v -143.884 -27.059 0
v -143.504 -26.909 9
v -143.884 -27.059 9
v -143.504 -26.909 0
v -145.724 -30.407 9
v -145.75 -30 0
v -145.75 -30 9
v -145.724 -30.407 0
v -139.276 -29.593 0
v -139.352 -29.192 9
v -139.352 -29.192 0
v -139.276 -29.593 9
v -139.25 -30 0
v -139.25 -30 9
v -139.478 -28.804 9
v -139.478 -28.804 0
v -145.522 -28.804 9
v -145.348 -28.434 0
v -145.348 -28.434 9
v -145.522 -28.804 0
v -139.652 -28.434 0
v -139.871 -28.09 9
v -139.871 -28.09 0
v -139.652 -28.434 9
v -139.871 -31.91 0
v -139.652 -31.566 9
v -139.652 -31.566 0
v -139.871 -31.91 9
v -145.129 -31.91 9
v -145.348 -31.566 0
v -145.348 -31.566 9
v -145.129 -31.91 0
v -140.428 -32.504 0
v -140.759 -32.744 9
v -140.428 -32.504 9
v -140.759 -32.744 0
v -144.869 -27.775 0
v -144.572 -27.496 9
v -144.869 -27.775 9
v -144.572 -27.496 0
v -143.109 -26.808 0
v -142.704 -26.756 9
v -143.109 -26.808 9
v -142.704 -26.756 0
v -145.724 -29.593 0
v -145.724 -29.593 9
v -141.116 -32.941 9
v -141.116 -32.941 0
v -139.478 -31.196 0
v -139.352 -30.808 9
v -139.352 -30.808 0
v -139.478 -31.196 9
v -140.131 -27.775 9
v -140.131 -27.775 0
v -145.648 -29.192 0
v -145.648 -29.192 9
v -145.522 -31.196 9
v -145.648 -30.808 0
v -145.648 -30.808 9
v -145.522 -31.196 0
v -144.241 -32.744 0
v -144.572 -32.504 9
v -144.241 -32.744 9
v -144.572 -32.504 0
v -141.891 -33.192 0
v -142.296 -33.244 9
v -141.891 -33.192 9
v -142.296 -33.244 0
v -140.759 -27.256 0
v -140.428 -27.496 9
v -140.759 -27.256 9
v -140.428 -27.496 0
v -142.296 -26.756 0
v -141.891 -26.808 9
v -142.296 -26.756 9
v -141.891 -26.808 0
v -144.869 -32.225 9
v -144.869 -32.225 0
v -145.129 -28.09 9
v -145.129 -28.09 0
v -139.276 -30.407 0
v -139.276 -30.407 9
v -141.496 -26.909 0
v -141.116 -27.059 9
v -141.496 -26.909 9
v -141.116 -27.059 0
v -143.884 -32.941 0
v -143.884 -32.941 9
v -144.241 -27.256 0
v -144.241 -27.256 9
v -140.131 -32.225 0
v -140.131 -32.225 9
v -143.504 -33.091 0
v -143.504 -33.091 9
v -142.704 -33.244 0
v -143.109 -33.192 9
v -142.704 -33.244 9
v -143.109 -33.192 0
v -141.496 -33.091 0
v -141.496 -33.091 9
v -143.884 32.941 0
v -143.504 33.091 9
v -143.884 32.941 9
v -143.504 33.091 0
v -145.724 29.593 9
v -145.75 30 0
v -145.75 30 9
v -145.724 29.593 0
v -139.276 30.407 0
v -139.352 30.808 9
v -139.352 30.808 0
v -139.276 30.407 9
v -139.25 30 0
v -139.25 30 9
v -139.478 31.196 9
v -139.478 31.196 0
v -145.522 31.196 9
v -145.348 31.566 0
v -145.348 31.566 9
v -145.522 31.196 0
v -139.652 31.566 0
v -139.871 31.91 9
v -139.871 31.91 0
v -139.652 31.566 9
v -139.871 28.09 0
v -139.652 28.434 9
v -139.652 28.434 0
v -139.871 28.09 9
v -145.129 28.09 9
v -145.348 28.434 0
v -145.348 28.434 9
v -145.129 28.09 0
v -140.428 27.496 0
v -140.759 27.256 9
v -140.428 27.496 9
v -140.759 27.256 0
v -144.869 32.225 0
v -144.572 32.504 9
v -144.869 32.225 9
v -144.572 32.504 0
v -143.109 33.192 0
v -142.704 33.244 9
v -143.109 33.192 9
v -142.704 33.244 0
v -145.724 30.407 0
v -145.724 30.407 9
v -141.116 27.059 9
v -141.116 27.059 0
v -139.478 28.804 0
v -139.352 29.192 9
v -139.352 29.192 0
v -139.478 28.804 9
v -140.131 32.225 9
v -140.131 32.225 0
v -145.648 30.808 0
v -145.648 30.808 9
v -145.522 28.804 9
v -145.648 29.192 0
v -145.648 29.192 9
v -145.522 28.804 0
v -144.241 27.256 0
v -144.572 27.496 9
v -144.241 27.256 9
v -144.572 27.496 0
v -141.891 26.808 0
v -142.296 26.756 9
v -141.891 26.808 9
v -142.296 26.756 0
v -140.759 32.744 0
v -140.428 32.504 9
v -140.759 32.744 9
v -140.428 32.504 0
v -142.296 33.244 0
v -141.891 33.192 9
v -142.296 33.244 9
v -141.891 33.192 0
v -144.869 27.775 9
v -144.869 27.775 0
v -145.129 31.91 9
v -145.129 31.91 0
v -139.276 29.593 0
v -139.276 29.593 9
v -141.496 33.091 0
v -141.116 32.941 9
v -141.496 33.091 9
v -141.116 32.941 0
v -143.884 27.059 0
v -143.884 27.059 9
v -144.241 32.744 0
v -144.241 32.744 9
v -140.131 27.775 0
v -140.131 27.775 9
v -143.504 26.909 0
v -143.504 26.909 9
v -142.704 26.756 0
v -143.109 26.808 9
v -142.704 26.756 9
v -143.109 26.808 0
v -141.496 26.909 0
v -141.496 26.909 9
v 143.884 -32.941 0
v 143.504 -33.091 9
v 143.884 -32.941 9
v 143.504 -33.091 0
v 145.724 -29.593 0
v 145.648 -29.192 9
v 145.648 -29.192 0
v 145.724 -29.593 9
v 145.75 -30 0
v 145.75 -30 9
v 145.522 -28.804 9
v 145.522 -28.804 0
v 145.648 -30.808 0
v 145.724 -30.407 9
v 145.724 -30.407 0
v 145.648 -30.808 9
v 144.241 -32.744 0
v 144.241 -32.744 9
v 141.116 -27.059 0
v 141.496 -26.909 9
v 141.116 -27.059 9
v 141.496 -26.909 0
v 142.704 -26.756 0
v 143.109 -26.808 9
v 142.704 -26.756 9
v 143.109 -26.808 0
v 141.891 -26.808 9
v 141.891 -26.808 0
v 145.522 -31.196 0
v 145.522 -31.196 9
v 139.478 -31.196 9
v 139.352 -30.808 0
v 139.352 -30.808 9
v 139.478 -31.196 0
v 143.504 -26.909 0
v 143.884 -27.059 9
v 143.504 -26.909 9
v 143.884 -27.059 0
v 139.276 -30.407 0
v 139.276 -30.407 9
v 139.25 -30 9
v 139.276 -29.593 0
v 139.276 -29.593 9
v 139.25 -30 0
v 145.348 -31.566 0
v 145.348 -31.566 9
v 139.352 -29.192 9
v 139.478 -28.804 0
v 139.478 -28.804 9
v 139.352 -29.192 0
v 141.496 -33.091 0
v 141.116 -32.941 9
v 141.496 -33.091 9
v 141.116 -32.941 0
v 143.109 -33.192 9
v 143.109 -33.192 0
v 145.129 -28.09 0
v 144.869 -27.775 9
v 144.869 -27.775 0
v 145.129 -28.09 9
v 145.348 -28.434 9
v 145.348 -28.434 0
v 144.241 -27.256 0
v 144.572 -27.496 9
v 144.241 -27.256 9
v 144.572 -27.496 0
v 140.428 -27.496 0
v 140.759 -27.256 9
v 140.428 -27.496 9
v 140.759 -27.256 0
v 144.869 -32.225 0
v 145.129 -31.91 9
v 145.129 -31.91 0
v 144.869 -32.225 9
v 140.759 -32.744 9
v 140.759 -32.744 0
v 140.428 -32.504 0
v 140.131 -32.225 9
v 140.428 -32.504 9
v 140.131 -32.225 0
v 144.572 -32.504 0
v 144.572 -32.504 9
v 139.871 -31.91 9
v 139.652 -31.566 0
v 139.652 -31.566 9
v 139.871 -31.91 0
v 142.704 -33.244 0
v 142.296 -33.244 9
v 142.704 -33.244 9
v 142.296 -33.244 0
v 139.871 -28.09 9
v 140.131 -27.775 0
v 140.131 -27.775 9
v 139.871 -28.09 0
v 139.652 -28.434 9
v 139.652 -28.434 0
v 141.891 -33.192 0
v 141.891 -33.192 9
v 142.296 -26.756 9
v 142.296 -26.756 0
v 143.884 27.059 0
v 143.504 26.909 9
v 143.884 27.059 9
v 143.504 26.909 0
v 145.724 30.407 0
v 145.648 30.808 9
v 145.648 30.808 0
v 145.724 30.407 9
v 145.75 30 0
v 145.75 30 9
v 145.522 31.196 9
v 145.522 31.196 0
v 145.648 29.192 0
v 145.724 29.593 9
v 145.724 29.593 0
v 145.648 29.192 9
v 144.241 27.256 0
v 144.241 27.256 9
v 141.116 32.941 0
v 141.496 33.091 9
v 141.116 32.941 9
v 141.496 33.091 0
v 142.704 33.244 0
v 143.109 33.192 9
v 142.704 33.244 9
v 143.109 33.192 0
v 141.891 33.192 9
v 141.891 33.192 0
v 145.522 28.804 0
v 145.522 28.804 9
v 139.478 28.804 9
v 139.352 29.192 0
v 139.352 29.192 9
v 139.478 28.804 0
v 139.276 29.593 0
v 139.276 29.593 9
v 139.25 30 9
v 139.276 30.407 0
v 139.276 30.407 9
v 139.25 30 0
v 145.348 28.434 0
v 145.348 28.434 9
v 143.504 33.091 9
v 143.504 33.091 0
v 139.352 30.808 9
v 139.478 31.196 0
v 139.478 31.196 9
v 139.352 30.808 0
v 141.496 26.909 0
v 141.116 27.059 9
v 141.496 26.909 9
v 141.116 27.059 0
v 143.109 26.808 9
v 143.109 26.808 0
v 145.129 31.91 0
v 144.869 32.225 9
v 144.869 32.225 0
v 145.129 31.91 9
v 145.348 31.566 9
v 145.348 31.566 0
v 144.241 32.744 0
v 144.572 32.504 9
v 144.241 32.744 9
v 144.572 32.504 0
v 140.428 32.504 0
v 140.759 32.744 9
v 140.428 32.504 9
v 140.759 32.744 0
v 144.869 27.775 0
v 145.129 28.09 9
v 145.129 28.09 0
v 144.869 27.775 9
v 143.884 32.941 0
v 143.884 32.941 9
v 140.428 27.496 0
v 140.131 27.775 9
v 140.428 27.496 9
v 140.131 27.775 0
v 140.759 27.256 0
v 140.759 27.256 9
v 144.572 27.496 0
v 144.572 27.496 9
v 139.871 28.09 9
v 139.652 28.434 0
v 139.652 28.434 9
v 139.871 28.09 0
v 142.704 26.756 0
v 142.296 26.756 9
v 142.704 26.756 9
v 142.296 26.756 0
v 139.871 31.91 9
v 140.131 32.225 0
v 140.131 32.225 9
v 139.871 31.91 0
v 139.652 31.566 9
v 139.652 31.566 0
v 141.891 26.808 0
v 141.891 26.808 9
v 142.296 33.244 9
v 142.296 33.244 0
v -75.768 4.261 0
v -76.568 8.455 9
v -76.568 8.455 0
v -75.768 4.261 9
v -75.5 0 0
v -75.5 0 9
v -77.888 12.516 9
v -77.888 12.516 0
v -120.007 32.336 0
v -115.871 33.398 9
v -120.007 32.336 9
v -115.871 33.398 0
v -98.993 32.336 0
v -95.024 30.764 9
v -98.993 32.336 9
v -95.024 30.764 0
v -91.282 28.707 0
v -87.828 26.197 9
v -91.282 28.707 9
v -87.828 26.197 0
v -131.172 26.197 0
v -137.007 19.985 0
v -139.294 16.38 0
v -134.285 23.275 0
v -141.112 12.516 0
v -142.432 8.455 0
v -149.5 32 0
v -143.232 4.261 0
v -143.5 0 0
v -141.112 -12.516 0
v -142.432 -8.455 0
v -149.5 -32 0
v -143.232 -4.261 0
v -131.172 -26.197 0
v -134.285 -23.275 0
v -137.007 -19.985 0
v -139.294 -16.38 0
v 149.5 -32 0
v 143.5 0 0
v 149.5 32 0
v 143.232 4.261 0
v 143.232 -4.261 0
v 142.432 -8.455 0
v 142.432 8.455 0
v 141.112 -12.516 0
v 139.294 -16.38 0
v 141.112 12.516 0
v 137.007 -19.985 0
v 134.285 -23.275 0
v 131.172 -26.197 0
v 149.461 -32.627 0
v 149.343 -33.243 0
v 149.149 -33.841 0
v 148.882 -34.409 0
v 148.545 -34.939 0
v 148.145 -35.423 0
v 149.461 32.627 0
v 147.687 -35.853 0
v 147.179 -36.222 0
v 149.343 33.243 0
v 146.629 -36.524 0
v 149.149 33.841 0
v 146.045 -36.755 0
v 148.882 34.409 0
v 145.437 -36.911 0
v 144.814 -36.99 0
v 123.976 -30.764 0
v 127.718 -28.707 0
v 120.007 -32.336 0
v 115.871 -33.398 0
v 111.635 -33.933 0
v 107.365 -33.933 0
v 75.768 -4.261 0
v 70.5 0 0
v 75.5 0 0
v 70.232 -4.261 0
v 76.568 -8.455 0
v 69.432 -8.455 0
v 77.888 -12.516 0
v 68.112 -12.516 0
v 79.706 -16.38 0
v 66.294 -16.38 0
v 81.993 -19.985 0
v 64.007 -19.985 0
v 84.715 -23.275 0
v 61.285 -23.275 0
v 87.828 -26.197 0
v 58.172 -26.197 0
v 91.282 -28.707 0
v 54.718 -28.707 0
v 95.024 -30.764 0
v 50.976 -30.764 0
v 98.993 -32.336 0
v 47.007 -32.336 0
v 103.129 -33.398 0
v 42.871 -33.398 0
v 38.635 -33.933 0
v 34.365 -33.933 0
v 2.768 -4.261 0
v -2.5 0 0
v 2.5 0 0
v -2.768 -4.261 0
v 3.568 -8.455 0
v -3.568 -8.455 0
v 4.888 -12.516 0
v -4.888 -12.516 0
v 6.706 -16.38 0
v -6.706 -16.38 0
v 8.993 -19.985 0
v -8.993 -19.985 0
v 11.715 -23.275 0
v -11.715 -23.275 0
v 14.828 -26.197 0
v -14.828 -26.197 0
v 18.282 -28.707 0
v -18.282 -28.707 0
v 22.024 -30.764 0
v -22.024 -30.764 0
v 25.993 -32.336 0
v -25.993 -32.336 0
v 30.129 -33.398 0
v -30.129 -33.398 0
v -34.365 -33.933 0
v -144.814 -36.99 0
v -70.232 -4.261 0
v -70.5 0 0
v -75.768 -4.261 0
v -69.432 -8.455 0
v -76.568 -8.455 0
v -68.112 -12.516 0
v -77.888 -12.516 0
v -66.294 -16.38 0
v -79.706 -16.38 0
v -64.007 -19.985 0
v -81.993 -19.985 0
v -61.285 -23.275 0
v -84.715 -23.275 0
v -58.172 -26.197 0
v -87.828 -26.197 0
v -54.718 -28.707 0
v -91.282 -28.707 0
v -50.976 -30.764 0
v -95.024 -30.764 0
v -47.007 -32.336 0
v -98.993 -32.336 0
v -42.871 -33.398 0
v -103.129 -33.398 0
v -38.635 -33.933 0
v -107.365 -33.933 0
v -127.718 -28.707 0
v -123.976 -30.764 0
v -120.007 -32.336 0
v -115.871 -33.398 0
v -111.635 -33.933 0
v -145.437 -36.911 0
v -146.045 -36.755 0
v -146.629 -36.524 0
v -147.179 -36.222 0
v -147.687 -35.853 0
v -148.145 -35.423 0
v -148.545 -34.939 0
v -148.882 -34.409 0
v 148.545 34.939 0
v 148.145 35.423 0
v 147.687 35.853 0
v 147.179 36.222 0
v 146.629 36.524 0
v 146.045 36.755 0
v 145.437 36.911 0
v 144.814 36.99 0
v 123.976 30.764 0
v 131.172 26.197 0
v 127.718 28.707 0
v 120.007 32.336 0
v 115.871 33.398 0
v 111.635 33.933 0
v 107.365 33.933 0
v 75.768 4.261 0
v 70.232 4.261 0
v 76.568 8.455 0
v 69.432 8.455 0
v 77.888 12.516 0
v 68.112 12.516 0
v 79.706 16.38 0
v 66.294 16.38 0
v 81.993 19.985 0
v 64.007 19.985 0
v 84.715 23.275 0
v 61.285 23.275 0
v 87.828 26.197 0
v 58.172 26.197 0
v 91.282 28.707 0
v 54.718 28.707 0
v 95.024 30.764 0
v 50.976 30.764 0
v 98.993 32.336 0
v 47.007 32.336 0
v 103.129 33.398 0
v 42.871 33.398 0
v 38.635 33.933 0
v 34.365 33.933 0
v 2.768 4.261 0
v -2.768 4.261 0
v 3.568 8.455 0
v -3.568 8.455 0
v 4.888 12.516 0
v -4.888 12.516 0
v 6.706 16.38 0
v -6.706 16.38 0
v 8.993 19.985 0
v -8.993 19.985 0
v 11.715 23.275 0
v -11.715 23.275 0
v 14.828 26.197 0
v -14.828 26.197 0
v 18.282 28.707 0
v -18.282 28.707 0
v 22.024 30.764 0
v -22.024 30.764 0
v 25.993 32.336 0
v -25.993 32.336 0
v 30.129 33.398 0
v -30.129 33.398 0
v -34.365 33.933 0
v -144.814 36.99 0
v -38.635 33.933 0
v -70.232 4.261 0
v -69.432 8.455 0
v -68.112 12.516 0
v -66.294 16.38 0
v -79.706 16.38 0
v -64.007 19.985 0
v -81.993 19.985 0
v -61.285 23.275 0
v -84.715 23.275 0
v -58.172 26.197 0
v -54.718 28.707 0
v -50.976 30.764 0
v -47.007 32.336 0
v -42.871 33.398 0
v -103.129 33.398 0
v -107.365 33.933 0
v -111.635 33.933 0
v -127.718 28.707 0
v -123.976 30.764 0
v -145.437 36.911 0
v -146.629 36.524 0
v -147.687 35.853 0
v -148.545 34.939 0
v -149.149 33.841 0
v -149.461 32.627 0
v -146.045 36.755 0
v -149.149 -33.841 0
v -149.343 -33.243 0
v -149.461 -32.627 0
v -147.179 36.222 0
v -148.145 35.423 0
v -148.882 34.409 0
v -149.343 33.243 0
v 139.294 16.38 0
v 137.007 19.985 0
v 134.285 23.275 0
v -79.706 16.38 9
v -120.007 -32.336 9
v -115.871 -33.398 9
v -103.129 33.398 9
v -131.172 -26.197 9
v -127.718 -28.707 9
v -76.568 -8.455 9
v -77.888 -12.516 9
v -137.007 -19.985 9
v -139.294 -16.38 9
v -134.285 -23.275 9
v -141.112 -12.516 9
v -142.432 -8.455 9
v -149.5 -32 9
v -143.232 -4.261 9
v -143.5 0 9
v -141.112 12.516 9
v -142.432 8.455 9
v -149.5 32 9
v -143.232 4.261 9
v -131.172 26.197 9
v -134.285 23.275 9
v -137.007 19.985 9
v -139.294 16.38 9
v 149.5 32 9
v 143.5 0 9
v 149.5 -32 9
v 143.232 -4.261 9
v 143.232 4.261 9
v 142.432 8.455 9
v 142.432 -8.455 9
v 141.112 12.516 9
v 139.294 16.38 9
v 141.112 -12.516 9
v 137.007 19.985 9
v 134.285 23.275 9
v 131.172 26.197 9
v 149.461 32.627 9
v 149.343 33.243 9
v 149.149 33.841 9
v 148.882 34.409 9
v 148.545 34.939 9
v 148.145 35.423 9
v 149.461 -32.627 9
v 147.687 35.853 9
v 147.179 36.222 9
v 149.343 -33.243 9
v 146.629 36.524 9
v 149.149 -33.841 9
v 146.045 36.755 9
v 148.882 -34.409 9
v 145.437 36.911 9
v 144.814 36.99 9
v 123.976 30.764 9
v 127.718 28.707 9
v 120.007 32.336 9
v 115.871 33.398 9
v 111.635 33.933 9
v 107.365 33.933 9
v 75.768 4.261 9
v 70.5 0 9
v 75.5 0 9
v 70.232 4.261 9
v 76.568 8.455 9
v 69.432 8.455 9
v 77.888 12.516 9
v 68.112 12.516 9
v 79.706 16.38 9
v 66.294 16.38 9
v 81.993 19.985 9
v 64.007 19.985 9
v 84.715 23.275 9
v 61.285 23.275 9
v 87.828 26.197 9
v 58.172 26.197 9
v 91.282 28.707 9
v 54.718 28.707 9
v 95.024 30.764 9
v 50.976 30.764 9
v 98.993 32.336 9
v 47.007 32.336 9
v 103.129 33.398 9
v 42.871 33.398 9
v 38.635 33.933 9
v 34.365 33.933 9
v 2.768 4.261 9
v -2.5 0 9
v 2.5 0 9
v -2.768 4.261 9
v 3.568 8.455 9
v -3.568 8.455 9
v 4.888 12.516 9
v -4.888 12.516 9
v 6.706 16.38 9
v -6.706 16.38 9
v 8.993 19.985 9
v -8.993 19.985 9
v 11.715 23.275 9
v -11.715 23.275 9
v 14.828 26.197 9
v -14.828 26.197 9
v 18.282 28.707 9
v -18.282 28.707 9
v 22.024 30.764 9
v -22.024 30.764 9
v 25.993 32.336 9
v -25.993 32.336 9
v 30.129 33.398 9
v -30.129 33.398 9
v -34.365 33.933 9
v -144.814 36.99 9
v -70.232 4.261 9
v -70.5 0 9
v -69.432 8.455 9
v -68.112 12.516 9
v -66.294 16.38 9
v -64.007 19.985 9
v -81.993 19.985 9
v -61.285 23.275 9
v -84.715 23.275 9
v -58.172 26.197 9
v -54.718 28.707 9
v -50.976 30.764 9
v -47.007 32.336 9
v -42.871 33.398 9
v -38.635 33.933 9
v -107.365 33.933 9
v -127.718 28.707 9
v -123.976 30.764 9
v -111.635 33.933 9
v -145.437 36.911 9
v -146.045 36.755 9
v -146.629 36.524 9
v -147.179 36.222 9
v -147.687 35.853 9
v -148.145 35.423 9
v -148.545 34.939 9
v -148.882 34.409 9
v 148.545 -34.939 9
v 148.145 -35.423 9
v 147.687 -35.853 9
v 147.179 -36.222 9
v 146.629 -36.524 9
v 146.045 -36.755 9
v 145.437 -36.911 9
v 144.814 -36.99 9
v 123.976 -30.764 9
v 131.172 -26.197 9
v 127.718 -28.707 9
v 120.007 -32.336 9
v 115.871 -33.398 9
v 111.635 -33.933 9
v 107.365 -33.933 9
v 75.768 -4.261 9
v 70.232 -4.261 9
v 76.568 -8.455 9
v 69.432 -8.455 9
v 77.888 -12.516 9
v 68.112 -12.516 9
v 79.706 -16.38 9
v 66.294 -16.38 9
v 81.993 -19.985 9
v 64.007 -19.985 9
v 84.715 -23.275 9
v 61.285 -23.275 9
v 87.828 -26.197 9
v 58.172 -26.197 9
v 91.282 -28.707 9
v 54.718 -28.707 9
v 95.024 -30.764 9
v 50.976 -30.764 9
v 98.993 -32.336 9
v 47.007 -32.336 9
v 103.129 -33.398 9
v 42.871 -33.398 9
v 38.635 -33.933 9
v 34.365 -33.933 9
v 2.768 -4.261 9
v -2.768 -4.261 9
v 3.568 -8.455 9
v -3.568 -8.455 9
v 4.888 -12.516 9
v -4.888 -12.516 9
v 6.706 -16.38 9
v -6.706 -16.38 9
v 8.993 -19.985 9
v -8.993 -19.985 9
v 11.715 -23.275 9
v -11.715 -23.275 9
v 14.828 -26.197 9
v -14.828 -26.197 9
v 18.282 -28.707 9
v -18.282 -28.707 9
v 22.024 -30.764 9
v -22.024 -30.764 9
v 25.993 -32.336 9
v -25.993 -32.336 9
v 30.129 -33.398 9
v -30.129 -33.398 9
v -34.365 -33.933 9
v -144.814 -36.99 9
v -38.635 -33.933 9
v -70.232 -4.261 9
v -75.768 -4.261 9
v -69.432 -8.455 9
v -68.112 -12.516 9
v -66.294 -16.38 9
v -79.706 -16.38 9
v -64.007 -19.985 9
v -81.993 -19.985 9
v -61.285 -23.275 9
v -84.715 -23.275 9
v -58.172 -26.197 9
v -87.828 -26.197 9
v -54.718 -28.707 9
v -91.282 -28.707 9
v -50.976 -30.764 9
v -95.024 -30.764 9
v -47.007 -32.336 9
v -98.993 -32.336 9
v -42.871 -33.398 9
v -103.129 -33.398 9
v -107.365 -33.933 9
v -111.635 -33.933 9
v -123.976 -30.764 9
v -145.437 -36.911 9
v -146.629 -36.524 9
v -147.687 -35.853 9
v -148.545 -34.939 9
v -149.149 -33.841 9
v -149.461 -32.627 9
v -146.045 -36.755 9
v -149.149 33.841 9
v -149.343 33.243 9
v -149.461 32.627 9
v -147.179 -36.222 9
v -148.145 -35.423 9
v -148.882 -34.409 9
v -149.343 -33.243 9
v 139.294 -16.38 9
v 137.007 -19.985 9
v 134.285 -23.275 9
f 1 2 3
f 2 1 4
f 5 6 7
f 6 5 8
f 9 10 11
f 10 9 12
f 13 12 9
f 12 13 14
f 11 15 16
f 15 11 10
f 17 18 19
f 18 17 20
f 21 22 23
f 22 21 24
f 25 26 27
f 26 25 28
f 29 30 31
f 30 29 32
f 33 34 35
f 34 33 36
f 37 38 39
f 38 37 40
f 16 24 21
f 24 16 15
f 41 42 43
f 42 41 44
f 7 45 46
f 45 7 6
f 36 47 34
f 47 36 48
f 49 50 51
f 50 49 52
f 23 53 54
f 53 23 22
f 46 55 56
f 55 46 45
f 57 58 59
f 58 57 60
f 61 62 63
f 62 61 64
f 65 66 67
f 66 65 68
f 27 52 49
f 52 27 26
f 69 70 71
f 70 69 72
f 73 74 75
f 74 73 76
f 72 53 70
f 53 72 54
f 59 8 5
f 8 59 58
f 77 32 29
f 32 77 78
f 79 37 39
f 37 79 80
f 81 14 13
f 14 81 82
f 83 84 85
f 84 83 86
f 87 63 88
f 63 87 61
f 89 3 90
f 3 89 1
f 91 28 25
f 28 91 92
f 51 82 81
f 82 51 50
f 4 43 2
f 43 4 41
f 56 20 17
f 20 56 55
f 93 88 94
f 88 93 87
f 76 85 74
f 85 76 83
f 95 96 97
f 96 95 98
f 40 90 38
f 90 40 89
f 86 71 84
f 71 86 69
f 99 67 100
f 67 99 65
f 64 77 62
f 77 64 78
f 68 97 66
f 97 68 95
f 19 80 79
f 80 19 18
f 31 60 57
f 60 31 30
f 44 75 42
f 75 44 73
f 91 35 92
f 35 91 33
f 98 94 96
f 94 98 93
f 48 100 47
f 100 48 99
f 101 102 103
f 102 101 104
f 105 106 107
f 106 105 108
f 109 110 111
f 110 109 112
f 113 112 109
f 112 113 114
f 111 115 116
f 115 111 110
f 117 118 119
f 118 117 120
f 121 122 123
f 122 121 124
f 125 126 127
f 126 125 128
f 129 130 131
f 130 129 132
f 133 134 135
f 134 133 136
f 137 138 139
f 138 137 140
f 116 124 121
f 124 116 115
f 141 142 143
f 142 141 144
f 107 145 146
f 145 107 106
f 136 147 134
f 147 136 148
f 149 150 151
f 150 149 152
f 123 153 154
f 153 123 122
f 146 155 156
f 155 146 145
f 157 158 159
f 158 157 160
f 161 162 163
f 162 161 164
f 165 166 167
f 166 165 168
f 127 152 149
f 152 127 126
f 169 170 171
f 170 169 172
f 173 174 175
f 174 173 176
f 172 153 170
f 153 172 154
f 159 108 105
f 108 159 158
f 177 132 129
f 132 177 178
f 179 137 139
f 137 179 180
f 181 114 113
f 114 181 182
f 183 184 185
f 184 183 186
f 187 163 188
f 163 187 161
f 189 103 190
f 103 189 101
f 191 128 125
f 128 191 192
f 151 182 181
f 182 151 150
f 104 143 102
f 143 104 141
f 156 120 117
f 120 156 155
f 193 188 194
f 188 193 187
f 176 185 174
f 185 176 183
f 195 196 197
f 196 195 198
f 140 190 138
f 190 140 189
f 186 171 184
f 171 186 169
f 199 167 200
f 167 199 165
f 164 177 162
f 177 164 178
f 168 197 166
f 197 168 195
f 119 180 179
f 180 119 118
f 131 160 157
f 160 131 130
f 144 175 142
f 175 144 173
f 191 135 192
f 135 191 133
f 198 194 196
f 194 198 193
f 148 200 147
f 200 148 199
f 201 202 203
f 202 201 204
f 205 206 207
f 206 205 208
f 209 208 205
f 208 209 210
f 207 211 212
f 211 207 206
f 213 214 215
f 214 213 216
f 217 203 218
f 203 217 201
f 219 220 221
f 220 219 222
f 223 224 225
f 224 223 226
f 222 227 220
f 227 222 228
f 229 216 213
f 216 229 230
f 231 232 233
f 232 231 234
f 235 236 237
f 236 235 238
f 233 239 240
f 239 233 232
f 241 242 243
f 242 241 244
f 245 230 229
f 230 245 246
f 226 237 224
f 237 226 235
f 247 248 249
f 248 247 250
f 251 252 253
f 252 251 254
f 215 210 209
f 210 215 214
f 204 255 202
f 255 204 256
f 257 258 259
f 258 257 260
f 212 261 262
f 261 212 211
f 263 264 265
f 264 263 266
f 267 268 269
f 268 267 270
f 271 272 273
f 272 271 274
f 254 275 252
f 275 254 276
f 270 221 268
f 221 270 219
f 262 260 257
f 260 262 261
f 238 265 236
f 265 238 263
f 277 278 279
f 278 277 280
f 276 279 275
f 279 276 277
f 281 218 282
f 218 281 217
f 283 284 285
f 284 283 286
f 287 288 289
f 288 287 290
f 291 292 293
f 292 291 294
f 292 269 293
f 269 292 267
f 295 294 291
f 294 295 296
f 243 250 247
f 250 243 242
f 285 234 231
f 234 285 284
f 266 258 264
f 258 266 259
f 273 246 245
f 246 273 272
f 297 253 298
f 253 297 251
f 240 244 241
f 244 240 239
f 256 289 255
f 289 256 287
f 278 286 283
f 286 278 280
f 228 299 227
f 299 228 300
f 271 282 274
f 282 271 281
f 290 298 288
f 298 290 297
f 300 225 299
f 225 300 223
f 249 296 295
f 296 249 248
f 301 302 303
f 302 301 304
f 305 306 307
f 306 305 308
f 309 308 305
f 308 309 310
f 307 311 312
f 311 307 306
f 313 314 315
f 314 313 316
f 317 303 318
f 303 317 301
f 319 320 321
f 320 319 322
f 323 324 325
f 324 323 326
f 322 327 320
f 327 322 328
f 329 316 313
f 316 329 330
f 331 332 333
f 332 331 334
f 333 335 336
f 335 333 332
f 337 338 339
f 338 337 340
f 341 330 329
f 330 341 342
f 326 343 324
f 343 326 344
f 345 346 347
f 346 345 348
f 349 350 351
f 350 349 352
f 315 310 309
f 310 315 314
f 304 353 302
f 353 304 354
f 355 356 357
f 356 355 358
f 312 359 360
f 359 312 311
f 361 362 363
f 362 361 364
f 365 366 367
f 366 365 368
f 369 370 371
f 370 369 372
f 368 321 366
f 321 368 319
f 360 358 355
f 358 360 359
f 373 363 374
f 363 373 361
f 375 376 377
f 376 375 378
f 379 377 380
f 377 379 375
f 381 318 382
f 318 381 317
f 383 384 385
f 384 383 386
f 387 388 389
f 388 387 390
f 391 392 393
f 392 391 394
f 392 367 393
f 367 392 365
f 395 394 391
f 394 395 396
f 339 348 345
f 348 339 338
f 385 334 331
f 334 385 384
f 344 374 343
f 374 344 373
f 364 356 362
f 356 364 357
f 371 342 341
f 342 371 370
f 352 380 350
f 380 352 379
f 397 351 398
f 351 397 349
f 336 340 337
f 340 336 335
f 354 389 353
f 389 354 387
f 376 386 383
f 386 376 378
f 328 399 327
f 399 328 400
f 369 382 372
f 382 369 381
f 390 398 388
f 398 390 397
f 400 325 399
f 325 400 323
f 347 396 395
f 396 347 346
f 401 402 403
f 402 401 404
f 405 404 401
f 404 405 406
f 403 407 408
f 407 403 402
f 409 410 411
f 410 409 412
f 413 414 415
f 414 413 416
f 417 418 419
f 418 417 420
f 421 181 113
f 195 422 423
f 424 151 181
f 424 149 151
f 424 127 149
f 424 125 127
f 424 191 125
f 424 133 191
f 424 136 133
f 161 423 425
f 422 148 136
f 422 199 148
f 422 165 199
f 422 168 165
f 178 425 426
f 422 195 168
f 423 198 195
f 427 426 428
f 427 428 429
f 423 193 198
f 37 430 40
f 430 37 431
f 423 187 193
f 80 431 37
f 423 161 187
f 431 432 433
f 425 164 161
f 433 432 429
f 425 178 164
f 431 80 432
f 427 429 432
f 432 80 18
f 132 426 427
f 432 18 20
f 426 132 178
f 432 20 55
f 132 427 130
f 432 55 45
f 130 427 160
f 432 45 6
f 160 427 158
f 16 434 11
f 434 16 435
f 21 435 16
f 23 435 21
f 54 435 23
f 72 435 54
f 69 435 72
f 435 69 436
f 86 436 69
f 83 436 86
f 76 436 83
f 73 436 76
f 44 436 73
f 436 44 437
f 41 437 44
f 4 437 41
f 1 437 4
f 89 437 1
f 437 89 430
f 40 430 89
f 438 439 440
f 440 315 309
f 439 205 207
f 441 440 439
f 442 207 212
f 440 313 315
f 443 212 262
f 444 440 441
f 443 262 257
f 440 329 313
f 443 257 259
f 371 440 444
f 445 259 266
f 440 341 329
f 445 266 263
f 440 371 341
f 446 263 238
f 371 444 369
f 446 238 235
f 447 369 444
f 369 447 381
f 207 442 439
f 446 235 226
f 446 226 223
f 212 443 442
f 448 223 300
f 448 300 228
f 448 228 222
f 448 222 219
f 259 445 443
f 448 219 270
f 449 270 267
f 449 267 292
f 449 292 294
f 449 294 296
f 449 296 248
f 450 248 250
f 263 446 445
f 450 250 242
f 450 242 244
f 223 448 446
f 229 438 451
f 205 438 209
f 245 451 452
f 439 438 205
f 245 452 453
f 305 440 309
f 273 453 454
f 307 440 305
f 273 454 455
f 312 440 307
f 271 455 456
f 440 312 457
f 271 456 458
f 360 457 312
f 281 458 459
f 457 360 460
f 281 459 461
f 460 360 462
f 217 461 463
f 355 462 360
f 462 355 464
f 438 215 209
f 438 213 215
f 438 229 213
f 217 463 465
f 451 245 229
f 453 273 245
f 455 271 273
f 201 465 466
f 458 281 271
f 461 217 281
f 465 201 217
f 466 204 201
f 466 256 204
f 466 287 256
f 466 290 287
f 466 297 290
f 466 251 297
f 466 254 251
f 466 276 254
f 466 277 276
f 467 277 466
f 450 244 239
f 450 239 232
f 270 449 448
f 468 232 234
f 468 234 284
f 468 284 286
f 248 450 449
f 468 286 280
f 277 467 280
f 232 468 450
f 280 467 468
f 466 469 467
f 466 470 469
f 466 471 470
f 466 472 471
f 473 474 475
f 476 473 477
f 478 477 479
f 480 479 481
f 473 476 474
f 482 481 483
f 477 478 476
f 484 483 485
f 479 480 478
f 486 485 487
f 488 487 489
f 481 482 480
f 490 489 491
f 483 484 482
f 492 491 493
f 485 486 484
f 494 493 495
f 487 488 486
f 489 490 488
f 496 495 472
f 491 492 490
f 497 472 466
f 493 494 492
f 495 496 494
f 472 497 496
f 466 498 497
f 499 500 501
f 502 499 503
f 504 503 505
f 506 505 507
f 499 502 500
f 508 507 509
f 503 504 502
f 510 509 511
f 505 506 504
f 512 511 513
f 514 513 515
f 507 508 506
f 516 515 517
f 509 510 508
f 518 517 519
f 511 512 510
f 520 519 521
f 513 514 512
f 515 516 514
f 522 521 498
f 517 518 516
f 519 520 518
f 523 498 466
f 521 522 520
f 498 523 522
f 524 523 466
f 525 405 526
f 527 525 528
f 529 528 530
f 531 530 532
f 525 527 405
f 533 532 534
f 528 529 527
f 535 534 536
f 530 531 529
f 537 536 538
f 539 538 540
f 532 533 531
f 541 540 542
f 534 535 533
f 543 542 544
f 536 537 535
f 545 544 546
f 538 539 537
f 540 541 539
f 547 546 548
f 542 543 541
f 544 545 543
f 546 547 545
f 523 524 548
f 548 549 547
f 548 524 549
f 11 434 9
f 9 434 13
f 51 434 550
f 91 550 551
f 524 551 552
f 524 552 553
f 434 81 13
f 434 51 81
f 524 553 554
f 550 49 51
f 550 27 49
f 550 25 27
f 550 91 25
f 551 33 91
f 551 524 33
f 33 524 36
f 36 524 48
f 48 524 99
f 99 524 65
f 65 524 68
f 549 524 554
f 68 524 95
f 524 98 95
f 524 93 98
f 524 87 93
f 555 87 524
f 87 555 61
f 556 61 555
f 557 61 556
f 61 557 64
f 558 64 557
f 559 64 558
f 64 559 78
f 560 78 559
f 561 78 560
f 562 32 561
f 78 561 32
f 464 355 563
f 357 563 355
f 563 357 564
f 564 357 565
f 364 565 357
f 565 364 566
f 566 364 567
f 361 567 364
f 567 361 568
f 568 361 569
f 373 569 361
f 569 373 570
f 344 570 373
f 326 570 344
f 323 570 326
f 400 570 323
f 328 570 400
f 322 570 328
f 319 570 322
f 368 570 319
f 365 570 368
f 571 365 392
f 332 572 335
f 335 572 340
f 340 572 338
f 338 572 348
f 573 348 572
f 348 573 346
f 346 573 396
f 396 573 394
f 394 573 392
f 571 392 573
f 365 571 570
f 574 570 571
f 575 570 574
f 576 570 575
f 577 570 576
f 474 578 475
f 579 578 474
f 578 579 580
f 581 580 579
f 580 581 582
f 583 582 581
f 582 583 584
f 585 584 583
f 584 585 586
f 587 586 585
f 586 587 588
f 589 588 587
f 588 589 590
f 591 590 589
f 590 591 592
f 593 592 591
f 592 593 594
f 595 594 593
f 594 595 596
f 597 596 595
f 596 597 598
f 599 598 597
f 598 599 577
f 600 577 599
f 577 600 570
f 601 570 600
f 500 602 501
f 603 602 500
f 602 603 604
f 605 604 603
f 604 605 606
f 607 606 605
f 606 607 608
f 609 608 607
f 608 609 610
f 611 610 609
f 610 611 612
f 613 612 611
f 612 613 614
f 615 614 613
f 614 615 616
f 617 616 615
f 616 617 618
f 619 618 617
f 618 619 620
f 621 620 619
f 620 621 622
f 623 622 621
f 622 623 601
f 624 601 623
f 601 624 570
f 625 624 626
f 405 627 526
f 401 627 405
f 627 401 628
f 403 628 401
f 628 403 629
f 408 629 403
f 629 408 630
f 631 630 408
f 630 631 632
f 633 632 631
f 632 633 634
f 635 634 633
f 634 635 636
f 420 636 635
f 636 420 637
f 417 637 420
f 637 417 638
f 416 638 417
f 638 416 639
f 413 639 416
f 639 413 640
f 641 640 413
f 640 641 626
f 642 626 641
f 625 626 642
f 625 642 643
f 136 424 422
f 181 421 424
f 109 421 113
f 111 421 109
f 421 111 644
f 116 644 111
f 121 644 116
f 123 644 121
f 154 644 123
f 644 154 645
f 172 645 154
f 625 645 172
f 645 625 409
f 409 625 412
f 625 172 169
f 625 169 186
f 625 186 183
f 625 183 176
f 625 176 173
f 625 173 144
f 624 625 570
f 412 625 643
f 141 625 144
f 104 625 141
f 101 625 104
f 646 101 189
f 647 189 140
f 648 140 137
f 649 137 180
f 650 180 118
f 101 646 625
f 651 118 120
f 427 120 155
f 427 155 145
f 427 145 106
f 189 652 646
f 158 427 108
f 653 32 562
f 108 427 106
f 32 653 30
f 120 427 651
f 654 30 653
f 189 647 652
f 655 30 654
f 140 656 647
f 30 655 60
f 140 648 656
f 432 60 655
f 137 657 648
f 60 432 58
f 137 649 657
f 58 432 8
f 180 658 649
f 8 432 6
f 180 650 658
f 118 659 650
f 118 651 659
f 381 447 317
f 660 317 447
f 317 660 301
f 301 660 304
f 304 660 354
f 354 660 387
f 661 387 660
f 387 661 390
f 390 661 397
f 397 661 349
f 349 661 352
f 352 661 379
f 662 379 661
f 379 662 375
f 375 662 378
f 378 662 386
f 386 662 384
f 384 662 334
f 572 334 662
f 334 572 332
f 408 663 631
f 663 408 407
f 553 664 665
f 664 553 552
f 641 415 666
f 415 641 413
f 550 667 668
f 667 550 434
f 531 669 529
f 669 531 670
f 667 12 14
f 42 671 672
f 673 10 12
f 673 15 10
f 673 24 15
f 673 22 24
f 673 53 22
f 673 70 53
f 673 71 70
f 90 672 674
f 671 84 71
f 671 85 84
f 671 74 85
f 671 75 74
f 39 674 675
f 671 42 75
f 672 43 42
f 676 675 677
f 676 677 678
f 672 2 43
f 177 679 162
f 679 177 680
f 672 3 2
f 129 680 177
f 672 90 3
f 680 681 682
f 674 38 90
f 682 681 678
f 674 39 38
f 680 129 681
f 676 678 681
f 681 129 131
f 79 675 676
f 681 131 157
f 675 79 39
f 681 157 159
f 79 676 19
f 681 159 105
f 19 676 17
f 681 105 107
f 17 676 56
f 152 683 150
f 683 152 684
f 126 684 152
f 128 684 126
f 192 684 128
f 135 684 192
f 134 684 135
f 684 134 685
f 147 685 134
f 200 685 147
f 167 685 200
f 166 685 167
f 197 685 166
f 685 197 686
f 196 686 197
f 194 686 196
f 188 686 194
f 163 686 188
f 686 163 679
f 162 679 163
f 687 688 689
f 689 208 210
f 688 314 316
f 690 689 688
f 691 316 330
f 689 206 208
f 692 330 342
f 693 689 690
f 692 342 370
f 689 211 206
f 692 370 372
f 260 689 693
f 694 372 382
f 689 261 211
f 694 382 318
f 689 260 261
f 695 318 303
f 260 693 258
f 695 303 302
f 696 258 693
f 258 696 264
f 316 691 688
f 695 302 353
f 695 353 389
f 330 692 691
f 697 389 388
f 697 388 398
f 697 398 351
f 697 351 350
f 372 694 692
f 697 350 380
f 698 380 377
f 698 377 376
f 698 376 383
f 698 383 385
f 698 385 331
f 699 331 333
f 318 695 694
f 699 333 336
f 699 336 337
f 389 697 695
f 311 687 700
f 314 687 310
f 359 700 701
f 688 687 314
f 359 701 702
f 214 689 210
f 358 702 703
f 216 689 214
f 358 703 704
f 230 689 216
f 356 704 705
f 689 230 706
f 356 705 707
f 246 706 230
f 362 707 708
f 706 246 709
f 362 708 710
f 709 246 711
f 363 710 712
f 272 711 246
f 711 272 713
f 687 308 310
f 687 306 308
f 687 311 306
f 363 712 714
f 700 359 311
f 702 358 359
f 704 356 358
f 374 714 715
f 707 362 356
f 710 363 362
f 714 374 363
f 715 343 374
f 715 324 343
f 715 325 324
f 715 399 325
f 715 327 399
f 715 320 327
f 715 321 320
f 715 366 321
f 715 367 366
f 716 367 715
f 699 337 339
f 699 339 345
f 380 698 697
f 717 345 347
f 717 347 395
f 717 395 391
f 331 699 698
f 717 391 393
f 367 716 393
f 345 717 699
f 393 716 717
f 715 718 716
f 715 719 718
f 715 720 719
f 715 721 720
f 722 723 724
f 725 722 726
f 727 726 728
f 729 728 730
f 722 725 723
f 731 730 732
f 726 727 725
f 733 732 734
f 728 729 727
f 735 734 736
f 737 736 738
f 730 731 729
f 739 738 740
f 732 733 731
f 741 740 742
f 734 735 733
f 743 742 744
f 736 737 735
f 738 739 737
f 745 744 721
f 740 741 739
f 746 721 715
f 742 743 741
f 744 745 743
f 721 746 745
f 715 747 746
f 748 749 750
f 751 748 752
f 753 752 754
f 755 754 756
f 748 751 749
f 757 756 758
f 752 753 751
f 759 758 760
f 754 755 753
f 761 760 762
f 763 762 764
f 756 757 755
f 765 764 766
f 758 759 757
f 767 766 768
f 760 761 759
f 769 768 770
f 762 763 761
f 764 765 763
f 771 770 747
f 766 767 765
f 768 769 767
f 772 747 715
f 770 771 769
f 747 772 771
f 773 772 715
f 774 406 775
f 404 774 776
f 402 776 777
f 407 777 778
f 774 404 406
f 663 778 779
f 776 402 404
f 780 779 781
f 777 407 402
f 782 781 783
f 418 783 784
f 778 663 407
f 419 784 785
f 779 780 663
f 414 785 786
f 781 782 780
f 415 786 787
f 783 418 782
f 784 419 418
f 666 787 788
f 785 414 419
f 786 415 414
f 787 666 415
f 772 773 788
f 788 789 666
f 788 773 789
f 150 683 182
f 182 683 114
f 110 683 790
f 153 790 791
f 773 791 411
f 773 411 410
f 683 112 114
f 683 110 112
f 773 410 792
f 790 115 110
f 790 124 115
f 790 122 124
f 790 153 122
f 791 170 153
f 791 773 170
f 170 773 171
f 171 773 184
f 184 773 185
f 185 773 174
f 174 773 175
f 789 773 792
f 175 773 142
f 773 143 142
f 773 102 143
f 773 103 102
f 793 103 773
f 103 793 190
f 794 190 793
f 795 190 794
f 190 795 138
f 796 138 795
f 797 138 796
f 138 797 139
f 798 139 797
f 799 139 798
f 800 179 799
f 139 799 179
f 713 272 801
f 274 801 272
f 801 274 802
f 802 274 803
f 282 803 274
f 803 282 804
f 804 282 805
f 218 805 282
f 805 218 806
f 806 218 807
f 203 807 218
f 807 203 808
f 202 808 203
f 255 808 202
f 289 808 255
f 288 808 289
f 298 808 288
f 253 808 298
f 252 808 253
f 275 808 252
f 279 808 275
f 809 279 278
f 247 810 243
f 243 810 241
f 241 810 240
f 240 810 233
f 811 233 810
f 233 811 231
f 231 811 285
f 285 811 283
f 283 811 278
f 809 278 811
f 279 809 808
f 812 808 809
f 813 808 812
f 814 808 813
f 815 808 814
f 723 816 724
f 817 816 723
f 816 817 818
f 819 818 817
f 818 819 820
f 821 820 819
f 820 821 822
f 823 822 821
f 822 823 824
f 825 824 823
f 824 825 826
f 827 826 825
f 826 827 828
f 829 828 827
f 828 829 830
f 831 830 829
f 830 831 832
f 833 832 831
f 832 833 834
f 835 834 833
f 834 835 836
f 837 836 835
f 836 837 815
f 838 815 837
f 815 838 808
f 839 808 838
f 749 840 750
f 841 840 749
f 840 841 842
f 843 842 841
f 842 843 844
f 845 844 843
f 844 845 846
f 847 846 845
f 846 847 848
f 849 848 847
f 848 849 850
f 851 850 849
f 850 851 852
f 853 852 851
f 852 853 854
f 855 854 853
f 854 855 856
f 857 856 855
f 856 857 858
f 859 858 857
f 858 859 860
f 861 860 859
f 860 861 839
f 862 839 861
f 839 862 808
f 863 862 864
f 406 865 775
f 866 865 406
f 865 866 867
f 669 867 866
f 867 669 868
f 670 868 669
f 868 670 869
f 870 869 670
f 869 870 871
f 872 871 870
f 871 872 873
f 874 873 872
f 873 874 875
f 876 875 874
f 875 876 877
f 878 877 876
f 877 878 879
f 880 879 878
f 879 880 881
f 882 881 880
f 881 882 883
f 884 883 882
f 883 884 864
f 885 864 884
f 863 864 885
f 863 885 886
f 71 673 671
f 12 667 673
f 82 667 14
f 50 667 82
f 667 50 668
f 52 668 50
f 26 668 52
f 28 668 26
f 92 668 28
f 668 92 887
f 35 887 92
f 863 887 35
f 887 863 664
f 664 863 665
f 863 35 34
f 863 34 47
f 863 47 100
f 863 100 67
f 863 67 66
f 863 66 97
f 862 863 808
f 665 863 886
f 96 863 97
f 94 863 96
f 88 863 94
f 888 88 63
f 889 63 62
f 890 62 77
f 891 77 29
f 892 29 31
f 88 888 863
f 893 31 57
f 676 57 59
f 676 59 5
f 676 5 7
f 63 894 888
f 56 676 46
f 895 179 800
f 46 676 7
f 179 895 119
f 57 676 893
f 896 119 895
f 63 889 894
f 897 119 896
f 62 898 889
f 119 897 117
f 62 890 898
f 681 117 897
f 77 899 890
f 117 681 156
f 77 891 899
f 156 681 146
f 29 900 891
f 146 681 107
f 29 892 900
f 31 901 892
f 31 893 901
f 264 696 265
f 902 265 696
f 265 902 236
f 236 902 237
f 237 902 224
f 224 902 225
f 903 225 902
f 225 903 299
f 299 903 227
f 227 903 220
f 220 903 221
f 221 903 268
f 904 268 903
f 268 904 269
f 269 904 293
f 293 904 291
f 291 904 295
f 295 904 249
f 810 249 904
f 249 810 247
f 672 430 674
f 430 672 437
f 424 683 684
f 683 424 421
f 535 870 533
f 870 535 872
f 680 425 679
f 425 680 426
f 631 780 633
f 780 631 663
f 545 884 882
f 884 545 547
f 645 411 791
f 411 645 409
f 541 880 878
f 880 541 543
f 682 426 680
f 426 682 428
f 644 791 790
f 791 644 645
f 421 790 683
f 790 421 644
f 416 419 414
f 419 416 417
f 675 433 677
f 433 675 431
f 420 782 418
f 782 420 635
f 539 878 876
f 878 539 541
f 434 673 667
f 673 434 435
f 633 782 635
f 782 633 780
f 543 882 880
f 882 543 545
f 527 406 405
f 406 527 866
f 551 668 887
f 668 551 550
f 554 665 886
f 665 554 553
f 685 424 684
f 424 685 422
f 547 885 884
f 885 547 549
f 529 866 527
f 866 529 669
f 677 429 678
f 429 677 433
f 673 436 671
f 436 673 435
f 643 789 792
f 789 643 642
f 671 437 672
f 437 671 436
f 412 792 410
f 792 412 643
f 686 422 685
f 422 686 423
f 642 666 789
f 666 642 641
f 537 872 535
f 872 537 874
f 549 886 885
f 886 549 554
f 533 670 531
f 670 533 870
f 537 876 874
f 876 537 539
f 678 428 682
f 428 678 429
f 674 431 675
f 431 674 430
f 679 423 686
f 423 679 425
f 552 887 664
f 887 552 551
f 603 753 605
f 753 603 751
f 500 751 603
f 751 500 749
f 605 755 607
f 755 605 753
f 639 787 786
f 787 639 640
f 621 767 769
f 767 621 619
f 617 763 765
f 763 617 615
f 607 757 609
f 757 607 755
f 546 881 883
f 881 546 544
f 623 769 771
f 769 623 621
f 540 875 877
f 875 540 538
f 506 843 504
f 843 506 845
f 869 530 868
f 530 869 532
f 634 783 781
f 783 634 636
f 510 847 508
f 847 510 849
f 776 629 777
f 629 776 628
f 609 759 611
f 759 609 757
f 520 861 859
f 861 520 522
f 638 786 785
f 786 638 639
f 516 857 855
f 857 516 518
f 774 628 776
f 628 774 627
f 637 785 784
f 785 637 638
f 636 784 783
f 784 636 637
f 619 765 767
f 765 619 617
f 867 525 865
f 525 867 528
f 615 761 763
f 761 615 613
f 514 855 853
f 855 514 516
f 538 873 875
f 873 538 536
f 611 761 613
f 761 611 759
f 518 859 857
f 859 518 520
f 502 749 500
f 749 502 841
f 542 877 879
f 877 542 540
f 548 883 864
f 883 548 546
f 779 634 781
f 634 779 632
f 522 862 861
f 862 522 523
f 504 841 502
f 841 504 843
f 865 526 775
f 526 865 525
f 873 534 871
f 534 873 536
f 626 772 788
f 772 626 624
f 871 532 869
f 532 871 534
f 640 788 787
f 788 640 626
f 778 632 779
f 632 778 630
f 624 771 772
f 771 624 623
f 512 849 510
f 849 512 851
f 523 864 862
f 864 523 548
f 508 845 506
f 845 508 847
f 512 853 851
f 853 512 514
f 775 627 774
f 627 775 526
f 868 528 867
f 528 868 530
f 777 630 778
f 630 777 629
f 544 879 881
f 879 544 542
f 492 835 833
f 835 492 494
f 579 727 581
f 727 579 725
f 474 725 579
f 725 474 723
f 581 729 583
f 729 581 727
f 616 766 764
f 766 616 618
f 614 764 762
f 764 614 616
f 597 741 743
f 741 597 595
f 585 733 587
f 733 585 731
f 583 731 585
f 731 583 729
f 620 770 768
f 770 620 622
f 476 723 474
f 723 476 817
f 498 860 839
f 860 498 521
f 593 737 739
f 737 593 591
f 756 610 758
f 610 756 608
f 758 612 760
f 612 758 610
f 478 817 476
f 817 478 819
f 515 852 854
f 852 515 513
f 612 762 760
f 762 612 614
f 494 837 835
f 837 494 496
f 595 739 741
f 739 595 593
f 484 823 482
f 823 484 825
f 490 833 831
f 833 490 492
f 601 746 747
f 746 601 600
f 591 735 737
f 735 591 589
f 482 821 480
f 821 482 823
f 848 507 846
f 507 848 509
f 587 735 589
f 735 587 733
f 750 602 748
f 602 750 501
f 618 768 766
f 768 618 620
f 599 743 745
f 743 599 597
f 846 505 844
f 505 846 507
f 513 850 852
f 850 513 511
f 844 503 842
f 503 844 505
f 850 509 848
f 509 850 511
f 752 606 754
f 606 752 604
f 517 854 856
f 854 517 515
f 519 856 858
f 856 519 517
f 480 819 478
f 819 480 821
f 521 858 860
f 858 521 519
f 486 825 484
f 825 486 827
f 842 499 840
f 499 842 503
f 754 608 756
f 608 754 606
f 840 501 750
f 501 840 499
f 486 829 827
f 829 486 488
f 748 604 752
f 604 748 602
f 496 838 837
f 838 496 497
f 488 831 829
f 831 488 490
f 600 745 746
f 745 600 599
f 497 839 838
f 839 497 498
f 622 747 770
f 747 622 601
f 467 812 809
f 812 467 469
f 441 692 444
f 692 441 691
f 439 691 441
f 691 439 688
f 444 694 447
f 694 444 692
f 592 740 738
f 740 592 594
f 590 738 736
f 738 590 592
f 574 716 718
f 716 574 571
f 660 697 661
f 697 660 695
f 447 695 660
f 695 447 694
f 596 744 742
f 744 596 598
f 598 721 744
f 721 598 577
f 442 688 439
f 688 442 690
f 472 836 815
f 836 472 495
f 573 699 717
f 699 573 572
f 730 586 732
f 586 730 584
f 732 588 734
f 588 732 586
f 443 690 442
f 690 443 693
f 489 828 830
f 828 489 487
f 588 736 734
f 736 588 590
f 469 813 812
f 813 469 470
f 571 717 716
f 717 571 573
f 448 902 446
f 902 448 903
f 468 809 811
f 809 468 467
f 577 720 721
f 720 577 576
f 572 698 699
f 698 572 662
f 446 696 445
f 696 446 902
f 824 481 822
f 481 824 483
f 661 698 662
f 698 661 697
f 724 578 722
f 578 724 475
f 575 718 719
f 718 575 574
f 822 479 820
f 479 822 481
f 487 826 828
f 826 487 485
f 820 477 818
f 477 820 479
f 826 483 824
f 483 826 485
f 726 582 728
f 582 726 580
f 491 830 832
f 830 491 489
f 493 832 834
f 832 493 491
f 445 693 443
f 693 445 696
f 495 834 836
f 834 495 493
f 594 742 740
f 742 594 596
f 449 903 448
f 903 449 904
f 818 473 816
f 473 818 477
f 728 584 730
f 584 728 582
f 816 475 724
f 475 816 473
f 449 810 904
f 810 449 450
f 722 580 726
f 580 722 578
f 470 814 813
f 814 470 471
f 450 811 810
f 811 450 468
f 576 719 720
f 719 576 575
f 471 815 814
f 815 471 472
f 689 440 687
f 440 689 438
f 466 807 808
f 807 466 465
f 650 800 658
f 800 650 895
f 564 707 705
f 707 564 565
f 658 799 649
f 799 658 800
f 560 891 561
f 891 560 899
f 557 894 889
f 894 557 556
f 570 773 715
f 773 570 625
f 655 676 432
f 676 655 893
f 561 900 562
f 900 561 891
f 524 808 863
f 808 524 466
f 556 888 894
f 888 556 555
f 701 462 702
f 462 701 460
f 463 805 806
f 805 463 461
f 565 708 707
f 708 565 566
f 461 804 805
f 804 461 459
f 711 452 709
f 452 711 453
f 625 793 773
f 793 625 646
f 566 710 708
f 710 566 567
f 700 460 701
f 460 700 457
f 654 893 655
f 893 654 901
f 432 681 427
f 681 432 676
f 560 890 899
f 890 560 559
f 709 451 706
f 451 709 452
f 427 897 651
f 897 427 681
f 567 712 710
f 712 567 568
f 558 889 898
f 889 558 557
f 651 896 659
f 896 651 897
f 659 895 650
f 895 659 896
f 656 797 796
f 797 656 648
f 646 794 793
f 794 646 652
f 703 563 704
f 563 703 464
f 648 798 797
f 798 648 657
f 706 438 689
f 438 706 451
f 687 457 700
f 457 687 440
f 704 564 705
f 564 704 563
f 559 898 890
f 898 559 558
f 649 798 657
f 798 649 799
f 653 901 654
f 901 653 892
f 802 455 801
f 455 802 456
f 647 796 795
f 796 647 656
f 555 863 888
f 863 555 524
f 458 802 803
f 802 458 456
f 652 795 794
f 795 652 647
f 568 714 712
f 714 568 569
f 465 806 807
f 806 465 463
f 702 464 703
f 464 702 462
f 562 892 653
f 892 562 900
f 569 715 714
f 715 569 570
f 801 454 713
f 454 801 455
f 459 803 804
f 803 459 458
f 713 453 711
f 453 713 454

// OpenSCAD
$fn = 50;


difference() {
	union() {
		hull() {
			translate(v = [-144.5000000000, 32.0000000000, 0]) {
				cylinder(h = 9, r = 5);
			}
			translate(v = [144.5000000000, 32.0000000000, 0]) {
				cylinder(h = 9, r = 5);
			}
			translate(v = [-144.5000000000, -32.0000000000, 0]) {
				cylinder(h = 9, r = 5);
			}
			translate(v = [144.5000000000, -32.0000000000, 0]) {
				cylinder(h = 9, r = 5);
			}
		}
	}
	union() {
		#translate(v = [-142.5000000000, -30.0000000000, -100.0000000000]) {
			cylinder(h = 200, r = 3.2500000000);
		}
		#translate(v = [-142.5000000000, 30.0000000000, -100.0000000000]) {
			cylinder(h = 200, r = 3.2500000000);
		}
		#translate(v = [142.5000000000, -30.0000000000, -100.0000000000]) {
			cylinder(h = 200, r = 3.2500000000);
		}
		#translate(v = [142.5000000000, 30.0000000000, -100.0000000000]) {
			cylinder(h = 200, r = 3.2500000000);
		}
		#translate(v = [-109.5000000000, 0, 0]) {
			cylinder(h = 9, r = 34.0000000000);
		}
		#translate(v = [-36.5000000000, 0, 0]) {
			cylinder(h = 9, r = 34.0000000000);
		}
		#translate(v = [36.5000000000, 0, 0]) {
			cylinder(h = 9, r = 34.0000000000);
		}
		#translate(v = [109.5000000000, 0, 0]) {
			cylinder(h = 9, r = 34.0000000000);
		}
	}
}
